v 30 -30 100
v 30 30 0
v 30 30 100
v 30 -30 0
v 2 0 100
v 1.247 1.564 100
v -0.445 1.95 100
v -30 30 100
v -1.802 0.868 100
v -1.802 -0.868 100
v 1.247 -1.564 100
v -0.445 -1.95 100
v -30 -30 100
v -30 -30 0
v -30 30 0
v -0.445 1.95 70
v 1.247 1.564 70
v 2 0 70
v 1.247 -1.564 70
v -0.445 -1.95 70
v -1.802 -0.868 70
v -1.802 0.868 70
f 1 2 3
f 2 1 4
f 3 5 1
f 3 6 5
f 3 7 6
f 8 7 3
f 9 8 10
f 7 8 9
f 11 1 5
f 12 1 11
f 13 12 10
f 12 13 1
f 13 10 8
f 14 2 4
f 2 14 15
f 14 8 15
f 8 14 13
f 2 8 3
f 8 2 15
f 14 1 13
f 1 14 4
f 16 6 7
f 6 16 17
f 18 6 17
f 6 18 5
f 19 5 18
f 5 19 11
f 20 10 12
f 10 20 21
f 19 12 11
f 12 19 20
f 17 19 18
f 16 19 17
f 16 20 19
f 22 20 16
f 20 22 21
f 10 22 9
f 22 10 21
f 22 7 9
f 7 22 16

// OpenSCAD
//Very simple furniture leg... so Roomba can vacuum underneath ;)

leg_width  =  60;
leg_height = 100;

screw_hole_diameter =  2;
screw_hole_height   = 30;

translate([0, 0, leg_height/2]) {

    difference() {
        cube([leg_width, leg_width, leg_height], center=true);
    
        translate([0, 0, leg_height/2-screw_hole_height/2]) {
            cylinder(screw_hole_height, screw_hole_diameter, screw_hole_diameter, center=true);
        }
    }
}
